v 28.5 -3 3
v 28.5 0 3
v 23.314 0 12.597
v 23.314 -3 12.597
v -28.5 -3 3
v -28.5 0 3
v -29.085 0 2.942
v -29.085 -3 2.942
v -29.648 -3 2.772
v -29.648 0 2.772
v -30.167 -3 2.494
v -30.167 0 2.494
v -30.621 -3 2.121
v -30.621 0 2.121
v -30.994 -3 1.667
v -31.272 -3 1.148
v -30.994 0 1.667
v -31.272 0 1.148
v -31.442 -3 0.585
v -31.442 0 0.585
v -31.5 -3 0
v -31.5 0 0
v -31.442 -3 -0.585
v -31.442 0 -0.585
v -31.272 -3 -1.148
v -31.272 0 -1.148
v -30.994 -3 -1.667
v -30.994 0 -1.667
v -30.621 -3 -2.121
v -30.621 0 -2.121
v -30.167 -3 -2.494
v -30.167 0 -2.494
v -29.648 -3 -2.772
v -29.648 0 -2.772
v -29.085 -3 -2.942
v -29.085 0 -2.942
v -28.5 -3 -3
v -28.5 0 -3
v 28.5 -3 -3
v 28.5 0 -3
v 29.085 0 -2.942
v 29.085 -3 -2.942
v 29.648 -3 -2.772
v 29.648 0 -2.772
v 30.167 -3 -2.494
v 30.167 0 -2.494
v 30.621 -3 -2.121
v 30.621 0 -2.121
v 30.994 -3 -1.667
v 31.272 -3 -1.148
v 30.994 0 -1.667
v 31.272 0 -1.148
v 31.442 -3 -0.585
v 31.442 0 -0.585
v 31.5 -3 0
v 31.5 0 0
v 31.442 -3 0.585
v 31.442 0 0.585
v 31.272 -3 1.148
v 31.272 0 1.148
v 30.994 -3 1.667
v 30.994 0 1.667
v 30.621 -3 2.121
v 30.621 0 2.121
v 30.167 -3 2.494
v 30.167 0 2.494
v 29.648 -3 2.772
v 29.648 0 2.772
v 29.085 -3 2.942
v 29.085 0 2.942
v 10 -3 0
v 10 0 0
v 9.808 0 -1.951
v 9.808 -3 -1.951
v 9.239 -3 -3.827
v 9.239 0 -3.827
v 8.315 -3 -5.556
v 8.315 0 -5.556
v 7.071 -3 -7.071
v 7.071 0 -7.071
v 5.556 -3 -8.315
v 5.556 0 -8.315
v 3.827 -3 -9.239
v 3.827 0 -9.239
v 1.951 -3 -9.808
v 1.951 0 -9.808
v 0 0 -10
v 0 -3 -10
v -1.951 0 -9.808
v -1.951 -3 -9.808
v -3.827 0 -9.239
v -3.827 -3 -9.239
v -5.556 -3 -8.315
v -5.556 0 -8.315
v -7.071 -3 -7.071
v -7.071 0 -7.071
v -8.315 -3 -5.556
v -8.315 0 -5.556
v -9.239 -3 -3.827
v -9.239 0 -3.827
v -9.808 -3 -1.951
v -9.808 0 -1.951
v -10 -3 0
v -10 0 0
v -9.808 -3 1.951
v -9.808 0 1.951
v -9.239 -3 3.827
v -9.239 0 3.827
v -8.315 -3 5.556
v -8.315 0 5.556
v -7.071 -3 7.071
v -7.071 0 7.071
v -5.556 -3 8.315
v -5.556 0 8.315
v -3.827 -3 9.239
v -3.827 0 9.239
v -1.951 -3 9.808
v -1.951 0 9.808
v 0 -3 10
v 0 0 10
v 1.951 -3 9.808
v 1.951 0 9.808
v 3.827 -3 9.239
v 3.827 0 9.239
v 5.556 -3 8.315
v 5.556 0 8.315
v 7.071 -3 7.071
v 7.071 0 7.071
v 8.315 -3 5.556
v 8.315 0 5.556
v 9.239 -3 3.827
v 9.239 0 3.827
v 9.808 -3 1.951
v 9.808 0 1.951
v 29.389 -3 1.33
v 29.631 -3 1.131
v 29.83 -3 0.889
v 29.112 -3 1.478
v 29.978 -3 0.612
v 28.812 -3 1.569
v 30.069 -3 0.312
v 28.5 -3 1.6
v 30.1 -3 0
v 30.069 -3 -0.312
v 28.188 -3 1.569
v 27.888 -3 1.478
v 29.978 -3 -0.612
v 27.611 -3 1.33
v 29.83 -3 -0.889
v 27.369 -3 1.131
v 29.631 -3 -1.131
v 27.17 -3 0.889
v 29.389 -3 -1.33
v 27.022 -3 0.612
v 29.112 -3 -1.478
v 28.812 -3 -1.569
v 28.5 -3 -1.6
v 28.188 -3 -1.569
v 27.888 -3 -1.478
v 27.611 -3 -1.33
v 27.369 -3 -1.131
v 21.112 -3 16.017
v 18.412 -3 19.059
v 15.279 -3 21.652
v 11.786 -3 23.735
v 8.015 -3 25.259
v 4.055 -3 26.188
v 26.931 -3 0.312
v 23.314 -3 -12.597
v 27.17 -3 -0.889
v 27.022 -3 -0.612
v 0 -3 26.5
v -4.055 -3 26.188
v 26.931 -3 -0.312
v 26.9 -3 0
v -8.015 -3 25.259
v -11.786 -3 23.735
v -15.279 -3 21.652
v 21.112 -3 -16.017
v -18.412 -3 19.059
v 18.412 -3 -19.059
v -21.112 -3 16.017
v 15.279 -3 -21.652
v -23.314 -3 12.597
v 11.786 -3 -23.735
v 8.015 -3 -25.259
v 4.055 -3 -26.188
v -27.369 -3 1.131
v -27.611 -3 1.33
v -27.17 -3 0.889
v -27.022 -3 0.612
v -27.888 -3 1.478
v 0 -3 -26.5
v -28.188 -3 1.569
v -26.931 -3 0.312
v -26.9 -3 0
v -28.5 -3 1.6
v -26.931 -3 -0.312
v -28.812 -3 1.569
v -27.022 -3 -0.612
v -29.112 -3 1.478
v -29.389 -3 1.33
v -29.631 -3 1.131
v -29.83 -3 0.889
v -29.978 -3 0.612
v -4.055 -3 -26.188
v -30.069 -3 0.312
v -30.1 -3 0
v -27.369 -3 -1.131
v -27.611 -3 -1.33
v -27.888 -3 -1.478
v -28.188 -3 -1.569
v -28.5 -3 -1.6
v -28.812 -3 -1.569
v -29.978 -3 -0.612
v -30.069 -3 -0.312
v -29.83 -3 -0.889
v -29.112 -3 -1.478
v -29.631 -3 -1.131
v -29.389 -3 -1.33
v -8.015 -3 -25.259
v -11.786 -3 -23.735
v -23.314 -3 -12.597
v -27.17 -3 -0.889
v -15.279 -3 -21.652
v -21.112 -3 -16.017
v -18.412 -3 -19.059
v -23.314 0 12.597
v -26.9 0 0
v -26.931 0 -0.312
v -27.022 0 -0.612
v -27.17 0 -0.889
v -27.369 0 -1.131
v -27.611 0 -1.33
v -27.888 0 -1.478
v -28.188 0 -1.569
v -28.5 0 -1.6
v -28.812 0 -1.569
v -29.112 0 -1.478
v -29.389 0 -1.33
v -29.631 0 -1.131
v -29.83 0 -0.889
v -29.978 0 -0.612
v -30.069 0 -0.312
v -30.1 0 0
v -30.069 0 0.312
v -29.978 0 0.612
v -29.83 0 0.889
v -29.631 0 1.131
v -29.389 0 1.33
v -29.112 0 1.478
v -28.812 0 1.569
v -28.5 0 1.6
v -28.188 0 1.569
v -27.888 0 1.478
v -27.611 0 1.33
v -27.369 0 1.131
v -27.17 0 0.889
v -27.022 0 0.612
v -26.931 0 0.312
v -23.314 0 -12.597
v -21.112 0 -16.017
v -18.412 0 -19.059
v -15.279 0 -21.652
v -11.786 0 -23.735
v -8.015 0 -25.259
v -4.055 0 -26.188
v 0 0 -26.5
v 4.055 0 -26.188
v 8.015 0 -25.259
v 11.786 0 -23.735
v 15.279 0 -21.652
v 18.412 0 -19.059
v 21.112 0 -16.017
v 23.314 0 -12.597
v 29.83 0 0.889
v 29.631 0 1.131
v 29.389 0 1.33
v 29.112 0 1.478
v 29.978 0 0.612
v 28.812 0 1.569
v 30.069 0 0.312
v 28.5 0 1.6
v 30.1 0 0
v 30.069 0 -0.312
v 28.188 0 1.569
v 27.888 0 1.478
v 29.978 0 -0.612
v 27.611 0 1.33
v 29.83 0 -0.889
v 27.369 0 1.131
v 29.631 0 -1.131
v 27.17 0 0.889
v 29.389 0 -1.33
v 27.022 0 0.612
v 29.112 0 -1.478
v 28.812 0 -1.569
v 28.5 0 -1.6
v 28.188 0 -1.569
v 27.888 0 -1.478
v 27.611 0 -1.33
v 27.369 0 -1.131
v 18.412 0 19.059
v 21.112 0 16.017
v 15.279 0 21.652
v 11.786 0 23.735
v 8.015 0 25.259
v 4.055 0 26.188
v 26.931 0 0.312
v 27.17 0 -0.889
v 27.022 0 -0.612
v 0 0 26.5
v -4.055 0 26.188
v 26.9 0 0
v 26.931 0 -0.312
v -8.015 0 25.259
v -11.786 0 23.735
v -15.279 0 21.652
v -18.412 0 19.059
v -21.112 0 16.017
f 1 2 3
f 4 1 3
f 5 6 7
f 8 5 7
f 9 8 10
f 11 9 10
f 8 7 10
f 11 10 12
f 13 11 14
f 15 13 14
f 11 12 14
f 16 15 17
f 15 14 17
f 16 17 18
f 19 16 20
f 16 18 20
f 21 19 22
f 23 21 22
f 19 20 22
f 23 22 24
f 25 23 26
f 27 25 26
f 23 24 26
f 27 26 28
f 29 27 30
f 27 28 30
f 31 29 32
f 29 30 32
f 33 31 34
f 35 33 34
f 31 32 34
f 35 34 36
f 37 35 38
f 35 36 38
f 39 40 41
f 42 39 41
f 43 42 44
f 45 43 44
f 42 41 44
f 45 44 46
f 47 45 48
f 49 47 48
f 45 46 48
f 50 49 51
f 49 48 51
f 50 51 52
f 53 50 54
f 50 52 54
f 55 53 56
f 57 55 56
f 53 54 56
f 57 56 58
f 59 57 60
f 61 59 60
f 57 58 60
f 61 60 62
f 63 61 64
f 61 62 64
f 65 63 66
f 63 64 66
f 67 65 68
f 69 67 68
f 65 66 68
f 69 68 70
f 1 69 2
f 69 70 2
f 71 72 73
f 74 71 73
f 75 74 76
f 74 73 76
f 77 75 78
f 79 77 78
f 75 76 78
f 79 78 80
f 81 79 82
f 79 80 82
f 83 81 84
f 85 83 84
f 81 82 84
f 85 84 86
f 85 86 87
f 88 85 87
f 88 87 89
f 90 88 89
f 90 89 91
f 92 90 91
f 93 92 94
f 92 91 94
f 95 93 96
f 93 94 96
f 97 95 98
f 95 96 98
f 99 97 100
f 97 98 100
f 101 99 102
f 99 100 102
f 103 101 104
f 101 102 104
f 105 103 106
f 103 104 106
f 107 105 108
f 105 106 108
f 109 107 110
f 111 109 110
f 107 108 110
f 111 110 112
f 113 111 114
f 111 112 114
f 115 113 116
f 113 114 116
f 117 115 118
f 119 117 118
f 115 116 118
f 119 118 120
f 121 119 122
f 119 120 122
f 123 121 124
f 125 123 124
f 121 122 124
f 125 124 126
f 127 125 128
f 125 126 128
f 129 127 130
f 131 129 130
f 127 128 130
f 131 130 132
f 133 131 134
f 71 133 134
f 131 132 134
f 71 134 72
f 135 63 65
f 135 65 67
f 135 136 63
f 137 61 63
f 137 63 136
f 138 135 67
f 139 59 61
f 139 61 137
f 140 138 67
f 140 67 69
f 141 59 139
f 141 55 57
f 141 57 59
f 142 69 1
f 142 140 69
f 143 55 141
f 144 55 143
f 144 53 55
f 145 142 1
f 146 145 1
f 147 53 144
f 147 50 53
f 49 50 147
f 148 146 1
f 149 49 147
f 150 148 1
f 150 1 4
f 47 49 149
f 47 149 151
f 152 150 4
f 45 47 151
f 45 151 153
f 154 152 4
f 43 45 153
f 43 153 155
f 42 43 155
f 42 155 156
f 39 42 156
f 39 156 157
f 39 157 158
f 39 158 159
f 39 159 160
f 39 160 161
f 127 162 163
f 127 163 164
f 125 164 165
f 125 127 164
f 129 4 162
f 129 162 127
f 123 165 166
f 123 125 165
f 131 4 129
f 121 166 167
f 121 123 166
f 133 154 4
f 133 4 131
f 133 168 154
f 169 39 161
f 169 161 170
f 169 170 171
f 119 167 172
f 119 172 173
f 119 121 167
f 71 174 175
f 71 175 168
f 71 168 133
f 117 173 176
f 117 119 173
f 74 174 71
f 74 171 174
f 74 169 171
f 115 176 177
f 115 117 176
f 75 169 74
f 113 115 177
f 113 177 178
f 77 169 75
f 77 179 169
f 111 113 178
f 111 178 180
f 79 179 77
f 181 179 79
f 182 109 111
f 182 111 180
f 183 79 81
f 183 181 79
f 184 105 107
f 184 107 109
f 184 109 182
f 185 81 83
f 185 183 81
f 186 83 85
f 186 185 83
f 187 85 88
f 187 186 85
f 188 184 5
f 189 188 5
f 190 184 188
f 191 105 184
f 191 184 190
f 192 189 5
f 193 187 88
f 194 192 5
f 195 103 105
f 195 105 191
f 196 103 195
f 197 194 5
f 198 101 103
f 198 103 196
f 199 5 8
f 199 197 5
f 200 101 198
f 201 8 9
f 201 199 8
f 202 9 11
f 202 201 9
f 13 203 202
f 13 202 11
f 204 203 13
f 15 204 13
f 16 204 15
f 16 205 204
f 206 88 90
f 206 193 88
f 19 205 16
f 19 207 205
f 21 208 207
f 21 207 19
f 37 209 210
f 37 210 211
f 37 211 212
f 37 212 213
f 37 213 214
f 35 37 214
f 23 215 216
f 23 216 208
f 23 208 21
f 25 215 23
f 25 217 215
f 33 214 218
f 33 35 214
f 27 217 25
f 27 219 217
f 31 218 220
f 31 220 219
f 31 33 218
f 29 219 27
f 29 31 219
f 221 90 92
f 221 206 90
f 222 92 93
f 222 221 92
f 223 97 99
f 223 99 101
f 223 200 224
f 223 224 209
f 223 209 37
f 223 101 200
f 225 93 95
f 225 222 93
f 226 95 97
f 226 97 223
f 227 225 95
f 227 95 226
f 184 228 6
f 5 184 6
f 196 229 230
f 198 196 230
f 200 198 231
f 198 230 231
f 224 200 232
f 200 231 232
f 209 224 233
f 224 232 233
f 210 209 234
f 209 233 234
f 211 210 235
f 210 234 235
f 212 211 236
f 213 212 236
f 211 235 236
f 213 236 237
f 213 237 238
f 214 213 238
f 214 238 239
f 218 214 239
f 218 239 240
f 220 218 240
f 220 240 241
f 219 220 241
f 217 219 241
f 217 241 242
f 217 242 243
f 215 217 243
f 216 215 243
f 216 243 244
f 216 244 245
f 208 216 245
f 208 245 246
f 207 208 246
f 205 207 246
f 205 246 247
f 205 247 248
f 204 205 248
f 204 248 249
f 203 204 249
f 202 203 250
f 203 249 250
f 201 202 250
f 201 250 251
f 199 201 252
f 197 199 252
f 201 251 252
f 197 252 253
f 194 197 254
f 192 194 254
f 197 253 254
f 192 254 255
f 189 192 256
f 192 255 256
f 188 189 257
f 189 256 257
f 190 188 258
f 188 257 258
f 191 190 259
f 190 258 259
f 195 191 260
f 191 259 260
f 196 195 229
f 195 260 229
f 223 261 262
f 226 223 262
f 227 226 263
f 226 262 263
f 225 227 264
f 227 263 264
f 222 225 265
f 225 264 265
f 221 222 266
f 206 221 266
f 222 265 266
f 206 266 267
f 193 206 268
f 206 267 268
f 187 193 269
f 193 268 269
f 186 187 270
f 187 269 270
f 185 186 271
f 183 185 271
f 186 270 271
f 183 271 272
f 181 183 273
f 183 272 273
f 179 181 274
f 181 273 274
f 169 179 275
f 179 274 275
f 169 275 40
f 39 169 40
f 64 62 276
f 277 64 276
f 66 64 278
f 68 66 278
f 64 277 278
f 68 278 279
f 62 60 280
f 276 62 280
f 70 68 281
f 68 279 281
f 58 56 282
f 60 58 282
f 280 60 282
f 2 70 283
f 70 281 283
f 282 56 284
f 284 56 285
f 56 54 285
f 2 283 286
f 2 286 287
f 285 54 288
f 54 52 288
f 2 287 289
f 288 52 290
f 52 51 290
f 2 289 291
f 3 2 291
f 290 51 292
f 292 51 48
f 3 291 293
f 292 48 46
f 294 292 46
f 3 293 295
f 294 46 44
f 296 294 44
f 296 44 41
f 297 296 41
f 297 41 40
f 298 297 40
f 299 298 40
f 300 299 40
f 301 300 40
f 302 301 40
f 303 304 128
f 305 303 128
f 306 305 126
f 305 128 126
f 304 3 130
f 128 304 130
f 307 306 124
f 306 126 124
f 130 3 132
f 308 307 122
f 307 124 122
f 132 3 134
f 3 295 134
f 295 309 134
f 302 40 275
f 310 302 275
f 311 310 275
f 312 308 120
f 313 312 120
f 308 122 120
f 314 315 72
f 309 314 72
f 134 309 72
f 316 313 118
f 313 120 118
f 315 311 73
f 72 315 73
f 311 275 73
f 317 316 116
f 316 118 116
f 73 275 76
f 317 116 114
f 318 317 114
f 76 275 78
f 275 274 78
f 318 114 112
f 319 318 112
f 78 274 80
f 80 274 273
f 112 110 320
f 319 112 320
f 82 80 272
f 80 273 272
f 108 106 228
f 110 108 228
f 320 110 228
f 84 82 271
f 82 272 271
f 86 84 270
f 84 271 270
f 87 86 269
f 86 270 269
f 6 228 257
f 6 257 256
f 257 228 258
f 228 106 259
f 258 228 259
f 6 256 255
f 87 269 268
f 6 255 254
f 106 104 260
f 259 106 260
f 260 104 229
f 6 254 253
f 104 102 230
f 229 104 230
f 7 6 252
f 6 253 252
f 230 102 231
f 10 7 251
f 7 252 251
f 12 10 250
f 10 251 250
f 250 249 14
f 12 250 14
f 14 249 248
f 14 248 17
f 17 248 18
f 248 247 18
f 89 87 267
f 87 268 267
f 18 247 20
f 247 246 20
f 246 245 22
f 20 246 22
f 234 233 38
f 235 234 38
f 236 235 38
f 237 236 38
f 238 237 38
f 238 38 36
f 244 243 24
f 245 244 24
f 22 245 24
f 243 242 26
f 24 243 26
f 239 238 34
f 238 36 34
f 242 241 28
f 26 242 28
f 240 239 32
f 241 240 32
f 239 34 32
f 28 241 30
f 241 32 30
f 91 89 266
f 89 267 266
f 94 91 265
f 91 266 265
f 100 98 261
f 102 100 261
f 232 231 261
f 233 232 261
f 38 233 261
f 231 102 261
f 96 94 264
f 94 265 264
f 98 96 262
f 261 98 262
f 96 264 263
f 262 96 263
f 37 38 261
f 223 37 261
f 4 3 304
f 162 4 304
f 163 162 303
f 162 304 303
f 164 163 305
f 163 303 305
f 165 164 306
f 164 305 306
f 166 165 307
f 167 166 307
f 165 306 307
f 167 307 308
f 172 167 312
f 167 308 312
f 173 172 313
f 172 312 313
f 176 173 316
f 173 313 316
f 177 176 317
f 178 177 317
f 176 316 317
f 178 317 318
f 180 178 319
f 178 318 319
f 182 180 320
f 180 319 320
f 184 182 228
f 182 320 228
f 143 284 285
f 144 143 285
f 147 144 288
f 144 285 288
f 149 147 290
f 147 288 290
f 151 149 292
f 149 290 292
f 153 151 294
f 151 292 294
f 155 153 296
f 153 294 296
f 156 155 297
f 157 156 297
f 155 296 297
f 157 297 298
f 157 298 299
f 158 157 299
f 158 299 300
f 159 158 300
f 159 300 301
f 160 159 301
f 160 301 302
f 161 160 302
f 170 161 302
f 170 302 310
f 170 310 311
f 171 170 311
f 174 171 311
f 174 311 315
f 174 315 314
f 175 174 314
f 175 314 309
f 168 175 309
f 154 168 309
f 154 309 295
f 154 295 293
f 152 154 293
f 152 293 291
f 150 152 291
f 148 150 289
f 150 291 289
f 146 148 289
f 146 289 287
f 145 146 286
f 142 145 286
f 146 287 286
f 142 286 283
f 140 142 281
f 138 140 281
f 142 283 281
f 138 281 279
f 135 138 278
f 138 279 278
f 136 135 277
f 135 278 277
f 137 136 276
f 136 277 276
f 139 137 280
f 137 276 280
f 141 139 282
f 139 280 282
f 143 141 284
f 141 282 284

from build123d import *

# Parameters (mm, degrees)
SKETCH1_R                = 10
BOSS_EXTRUDE1_DEPTH      = 3
M3_CLEARANCE_HOLE1_D     = 3.2
M3_CLEARANCE_HOLE1_DEPTH = 3


with BuildPart() as part:
    # Sketch1 → Boss-Extrude1 (new body)
    with BuildSketch(Plane(origin=(0, 0, 0), x_dir=(1, 0, 0), z_dir=(0, 1, 0))):
        with BuildLine():
            Line((-28.5, 3), (-23.314316453, 12.597327031))
            ThreePointArc((-23.314316453, 12.597327031), (0, 26.5), (23.314316453, 12.597327031))
            Line((23.314316453, 12.597327031), (28.5, 3))
            ThreePointArc((28.5, 3), (31.5, 0), (28.5, -3))
            Line((28.5, -3), (23.314316453, -12.597327031))
            ThreePointArc((23.314316453, -12.597327031), (0, -26.5), (-23.314316453, -12.597327031))
            Line((-23.314316453, -12.597327031), (-28.5, -3))
            ThreePointArc((-28.5, -3), (-31.5, 0), (-28.5, 3))
        make_face()
        Circle(SKETCH1_R, mode=Mode.SUBTRACT)
    extrude(amount=-BOSS_EXTRUDE1_DEPTH)

    # M3 Clearance Hole1
    with Locations(Plane(origin=(0, -3, 0), x_dir=(-1, 0, 0), z_dir=(0, -1, 0))):
        with Locations((-28.5, 0), (28.5, 0)):
            Hole(M3_CLEARANCE_HOLE1_D / 2, depth=M3_CLEARANCE_HOLE1_DEPTH)


solid = part.part
